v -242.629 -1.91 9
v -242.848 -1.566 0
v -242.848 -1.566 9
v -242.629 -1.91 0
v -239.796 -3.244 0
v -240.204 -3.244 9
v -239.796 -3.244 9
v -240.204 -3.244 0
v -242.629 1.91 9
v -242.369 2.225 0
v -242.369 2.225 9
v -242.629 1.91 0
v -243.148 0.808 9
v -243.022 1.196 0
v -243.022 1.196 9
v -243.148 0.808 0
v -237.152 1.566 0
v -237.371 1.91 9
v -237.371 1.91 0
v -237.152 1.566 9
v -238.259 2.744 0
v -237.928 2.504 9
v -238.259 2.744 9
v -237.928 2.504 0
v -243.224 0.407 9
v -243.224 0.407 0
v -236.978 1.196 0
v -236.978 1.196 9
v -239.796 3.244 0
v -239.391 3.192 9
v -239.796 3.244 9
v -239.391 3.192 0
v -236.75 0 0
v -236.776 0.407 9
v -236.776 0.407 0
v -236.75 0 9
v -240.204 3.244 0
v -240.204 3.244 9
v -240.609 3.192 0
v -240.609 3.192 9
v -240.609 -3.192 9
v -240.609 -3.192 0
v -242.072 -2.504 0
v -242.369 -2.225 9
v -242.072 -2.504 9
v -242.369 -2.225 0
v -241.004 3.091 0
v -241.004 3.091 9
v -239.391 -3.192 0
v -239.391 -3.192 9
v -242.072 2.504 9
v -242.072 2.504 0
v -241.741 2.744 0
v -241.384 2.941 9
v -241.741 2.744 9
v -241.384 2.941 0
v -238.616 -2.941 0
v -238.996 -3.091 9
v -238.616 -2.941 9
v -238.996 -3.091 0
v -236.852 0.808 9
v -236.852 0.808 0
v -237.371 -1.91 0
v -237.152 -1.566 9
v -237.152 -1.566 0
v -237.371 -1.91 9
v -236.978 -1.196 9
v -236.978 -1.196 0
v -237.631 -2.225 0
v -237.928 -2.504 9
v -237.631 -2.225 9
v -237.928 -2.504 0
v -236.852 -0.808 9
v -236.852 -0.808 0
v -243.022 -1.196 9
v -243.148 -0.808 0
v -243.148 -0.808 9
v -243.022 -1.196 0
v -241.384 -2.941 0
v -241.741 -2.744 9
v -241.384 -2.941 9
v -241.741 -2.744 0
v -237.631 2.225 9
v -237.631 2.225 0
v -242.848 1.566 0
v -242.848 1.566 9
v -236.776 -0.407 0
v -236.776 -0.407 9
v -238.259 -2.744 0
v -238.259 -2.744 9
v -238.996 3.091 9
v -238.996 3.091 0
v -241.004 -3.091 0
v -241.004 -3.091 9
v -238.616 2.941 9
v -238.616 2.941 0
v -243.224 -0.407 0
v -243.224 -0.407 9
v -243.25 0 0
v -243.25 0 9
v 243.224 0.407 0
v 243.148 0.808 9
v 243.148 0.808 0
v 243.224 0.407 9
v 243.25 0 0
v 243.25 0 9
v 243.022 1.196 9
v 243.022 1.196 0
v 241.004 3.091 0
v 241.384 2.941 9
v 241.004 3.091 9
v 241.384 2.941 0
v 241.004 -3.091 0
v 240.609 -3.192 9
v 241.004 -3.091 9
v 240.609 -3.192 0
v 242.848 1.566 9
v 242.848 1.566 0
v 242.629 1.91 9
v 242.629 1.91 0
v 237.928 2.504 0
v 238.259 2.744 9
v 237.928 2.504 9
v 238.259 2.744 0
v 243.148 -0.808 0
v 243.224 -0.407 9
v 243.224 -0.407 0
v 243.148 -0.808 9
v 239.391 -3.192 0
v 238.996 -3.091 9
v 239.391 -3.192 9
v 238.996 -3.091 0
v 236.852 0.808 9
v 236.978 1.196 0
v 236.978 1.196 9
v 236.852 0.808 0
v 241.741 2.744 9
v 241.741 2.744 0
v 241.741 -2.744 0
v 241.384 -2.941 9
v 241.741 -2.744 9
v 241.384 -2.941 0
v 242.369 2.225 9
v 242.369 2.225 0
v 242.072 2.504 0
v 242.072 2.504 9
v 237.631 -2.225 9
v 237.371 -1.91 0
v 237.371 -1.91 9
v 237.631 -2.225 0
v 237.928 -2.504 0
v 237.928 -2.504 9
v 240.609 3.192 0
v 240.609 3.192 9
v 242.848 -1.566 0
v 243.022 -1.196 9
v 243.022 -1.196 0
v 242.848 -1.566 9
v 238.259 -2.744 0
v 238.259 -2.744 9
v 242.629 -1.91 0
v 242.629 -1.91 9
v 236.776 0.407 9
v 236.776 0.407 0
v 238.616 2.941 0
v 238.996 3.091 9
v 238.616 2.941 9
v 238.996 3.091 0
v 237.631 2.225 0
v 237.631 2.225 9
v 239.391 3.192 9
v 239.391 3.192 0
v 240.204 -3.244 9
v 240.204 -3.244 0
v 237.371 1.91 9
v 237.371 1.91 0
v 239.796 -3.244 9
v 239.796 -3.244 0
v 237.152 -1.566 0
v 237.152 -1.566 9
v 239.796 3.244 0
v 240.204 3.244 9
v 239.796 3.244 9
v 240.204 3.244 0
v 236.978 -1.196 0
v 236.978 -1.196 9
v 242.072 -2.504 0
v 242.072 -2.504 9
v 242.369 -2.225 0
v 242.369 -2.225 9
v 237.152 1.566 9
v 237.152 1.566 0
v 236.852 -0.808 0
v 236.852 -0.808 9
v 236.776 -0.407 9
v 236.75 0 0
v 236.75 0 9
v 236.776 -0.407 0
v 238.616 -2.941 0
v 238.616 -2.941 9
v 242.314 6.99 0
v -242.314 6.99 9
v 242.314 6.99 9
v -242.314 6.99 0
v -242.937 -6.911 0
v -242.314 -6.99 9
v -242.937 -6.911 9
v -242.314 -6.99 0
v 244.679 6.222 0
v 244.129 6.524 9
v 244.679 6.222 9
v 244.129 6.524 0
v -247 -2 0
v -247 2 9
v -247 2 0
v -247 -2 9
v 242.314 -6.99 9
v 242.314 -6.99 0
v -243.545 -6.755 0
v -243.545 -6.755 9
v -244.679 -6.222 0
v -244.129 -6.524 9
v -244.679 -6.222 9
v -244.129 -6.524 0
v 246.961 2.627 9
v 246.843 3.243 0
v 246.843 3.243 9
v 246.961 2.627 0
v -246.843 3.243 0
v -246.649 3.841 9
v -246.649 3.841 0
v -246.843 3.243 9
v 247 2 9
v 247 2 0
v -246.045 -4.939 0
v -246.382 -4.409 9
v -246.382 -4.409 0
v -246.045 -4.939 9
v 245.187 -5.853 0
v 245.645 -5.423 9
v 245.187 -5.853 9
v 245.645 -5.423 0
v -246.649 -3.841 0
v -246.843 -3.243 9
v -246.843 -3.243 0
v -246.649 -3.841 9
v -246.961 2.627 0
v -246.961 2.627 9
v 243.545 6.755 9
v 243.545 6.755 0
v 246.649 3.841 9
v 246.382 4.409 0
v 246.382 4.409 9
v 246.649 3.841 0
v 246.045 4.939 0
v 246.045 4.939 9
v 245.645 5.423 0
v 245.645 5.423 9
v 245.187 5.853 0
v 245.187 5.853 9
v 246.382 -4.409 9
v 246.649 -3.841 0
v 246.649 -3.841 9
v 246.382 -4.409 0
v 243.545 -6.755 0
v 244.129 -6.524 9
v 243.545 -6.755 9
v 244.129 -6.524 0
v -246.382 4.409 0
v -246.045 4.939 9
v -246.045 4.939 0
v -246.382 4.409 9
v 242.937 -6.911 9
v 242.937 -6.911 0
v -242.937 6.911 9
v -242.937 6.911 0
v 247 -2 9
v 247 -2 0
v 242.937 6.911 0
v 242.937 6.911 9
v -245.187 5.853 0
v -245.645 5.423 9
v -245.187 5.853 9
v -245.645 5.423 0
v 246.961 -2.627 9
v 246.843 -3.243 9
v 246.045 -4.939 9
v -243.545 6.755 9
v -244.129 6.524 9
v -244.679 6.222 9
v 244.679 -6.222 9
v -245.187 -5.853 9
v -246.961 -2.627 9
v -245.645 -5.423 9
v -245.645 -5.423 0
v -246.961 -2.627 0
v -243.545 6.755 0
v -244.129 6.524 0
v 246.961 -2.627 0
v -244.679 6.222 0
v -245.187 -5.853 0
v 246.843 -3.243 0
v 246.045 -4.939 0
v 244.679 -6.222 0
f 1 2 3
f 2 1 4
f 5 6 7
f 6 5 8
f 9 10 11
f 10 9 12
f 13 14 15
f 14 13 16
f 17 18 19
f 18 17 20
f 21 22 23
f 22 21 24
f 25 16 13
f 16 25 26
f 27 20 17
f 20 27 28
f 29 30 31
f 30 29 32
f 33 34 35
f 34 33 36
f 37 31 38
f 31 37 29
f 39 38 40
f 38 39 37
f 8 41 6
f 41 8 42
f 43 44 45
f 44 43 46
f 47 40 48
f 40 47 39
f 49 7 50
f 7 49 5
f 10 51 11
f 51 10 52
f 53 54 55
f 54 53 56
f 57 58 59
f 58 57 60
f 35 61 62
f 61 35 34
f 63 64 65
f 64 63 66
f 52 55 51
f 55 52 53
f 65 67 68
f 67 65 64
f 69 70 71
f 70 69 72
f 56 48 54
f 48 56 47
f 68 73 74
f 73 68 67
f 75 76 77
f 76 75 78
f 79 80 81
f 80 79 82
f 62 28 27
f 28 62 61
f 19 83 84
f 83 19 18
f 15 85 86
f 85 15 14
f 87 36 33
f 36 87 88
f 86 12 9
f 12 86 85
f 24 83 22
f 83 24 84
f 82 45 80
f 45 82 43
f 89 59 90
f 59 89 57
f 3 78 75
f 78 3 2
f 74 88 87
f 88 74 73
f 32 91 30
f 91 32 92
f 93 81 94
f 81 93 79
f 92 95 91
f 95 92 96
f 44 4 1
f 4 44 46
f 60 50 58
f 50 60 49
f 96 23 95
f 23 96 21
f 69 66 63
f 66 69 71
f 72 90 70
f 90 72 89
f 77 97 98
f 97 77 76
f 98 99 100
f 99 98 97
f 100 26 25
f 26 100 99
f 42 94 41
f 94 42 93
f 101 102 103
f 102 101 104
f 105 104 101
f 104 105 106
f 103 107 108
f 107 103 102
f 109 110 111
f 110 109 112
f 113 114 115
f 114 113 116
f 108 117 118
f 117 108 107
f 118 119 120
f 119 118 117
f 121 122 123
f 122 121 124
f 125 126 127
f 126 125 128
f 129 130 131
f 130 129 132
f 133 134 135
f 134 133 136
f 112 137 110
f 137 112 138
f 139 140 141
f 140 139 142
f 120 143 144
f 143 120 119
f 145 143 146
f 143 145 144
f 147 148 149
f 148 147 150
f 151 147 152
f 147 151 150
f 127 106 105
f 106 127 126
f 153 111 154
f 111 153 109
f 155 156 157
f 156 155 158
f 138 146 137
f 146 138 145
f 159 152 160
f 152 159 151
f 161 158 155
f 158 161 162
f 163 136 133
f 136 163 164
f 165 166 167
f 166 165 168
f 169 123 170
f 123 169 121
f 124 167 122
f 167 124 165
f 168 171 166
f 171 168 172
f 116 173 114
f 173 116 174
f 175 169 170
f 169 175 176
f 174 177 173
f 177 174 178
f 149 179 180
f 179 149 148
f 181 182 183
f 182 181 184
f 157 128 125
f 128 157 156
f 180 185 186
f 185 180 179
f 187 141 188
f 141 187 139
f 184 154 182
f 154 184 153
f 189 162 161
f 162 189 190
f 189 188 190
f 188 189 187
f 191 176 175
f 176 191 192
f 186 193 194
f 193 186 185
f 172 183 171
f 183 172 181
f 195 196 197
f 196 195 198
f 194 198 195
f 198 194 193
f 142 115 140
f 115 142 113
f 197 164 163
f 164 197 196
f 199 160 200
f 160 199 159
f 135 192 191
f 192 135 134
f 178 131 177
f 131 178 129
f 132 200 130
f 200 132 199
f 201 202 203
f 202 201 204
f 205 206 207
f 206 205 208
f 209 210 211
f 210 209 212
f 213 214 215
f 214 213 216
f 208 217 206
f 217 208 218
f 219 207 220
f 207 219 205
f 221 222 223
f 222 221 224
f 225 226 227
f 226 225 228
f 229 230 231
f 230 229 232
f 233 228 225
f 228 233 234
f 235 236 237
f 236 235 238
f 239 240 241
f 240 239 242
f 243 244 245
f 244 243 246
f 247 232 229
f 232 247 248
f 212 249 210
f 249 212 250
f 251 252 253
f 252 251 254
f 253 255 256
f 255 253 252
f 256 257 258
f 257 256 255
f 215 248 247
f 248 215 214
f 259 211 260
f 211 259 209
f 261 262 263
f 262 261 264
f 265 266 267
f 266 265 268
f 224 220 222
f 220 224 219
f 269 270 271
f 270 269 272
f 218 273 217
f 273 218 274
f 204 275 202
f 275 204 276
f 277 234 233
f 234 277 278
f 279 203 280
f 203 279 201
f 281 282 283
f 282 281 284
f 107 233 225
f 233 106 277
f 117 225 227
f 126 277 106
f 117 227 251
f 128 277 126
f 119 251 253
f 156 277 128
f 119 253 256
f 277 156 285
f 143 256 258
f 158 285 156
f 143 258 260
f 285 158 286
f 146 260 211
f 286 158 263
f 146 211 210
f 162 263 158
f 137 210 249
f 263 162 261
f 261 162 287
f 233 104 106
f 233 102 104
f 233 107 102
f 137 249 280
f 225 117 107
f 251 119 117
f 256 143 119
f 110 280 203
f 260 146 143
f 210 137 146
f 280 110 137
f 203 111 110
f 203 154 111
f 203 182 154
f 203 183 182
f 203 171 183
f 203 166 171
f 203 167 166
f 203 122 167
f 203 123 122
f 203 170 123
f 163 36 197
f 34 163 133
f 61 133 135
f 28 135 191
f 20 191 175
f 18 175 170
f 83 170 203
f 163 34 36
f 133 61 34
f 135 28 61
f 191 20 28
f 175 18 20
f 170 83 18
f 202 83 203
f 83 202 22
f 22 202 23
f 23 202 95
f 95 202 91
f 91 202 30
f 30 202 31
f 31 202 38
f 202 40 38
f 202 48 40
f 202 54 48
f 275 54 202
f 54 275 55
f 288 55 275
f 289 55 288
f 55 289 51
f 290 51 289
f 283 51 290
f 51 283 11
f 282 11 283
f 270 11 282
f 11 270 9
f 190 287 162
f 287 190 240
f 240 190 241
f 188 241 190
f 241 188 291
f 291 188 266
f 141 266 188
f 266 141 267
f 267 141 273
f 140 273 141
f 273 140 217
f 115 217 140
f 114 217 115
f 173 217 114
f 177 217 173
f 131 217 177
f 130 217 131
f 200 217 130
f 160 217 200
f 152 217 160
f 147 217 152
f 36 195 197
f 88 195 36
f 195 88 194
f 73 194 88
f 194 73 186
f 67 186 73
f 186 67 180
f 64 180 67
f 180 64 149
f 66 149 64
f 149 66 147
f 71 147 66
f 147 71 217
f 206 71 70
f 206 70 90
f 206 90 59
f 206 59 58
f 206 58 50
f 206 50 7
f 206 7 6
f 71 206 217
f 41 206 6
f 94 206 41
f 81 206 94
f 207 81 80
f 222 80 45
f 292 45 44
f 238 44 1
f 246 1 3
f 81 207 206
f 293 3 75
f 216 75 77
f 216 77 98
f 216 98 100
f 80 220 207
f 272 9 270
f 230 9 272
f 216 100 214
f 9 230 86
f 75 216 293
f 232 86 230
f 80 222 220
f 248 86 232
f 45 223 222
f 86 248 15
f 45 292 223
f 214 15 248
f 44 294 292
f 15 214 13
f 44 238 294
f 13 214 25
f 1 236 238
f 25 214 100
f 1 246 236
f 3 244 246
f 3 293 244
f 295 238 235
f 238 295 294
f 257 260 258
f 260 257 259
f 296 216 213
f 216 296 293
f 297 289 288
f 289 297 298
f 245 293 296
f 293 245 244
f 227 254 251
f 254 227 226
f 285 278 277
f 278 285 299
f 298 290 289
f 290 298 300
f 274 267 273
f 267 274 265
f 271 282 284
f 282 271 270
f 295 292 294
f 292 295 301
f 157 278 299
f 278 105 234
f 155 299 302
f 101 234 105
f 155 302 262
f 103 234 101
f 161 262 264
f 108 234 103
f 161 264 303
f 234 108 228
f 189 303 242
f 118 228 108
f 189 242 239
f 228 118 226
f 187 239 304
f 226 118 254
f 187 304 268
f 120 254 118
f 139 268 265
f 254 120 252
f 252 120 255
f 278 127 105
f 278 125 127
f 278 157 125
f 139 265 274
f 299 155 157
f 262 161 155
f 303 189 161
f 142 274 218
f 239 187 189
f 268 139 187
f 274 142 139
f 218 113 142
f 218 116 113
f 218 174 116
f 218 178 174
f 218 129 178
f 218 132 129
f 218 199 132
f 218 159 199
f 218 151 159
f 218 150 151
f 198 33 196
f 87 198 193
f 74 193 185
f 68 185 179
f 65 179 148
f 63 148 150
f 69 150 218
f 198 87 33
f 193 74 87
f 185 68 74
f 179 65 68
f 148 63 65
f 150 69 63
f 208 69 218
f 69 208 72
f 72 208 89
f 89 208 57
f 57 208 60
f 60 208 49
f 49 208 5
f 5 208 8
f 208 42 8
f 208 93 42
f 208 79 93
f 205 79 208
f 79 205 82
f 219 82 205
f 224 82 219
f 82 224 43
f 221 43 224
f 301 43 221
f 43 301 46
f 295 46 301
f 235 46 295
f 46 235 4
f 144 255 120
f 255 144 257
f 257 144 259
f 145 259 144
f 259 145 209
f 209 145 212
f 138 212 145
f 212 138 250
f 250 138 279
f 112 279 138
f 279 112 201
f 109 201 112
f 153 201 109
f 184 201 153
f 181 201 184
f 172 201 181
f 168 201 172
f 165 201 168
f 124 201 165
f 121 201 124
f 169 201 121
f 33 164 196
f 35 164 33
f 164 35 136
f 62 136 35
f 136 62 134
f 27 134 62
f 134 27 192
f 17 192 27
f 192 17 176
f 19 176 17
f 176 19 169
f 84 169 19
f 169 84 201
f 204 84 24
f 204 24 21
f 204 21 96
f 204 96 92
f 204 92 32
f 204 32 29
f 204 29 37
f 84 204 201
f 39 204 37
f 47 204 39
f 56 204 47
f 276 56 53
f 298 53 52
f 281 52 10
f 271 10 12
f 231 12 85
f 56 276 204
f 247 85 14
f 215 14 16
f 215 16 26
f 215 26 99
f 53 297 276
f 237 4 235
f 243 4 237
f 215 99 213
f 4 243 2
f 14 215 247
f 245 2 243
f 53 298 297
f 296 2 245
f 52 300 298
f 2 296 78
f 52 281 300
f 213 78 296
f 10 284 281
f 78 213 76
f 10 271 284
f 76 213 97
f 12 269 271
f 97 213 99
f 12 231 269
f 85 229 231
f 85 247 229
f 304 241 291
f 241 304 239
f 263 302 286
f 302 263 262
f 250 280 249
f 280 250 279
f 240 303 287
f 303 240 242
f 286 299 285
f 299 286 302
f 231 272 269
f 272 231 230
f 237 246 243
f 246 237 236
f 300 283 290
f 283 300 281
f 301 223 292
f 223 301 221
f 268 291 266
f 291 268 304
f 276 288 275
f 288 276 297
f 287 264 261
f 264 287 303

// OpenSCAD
$fn = 50;


difference() {
	union() {
		hull() {
			translate(v = [-242.0000000000, 2.0000000000, 0]) {
				cylinder(h = 9, r = 5);
			}
			translate(v = [242.0000000000, 2.0000000000, 0]) {
				cylinder(h = 9, r = 5);
			}
			translate(v = [-242.0000000000, -2.0000000000, 0]) {
				cylinder(h = 9, r = 5);
			}
			translate(v = [242.0000000000, -2.0000000000, 0]) {
				cylinder(h = 9, r = 5);
			}
		}
	}
	union() {
		translate(v = [-240.0000000000, 0.0000000000, -100.0000000000]) {
			cylinder(h = 200, r = 3.2500000000);
		}
		translate(v = [-240.0000000000, 0.0000000000, -100.0000000000]) {
			cylinder(h = 200, r = 3.2500000000);
		}
		translate(v = [240.0000000000, 0.0000000000, -100.0000000000]) {
			cylinder(h = 200, r = 3.2500000000);
		}
		translate(v = [240.0000000000, 0.0000000000, -100.0000000000]) {
			cylinder(h = 200, r = 3.2500000000);
		}
	}
}
